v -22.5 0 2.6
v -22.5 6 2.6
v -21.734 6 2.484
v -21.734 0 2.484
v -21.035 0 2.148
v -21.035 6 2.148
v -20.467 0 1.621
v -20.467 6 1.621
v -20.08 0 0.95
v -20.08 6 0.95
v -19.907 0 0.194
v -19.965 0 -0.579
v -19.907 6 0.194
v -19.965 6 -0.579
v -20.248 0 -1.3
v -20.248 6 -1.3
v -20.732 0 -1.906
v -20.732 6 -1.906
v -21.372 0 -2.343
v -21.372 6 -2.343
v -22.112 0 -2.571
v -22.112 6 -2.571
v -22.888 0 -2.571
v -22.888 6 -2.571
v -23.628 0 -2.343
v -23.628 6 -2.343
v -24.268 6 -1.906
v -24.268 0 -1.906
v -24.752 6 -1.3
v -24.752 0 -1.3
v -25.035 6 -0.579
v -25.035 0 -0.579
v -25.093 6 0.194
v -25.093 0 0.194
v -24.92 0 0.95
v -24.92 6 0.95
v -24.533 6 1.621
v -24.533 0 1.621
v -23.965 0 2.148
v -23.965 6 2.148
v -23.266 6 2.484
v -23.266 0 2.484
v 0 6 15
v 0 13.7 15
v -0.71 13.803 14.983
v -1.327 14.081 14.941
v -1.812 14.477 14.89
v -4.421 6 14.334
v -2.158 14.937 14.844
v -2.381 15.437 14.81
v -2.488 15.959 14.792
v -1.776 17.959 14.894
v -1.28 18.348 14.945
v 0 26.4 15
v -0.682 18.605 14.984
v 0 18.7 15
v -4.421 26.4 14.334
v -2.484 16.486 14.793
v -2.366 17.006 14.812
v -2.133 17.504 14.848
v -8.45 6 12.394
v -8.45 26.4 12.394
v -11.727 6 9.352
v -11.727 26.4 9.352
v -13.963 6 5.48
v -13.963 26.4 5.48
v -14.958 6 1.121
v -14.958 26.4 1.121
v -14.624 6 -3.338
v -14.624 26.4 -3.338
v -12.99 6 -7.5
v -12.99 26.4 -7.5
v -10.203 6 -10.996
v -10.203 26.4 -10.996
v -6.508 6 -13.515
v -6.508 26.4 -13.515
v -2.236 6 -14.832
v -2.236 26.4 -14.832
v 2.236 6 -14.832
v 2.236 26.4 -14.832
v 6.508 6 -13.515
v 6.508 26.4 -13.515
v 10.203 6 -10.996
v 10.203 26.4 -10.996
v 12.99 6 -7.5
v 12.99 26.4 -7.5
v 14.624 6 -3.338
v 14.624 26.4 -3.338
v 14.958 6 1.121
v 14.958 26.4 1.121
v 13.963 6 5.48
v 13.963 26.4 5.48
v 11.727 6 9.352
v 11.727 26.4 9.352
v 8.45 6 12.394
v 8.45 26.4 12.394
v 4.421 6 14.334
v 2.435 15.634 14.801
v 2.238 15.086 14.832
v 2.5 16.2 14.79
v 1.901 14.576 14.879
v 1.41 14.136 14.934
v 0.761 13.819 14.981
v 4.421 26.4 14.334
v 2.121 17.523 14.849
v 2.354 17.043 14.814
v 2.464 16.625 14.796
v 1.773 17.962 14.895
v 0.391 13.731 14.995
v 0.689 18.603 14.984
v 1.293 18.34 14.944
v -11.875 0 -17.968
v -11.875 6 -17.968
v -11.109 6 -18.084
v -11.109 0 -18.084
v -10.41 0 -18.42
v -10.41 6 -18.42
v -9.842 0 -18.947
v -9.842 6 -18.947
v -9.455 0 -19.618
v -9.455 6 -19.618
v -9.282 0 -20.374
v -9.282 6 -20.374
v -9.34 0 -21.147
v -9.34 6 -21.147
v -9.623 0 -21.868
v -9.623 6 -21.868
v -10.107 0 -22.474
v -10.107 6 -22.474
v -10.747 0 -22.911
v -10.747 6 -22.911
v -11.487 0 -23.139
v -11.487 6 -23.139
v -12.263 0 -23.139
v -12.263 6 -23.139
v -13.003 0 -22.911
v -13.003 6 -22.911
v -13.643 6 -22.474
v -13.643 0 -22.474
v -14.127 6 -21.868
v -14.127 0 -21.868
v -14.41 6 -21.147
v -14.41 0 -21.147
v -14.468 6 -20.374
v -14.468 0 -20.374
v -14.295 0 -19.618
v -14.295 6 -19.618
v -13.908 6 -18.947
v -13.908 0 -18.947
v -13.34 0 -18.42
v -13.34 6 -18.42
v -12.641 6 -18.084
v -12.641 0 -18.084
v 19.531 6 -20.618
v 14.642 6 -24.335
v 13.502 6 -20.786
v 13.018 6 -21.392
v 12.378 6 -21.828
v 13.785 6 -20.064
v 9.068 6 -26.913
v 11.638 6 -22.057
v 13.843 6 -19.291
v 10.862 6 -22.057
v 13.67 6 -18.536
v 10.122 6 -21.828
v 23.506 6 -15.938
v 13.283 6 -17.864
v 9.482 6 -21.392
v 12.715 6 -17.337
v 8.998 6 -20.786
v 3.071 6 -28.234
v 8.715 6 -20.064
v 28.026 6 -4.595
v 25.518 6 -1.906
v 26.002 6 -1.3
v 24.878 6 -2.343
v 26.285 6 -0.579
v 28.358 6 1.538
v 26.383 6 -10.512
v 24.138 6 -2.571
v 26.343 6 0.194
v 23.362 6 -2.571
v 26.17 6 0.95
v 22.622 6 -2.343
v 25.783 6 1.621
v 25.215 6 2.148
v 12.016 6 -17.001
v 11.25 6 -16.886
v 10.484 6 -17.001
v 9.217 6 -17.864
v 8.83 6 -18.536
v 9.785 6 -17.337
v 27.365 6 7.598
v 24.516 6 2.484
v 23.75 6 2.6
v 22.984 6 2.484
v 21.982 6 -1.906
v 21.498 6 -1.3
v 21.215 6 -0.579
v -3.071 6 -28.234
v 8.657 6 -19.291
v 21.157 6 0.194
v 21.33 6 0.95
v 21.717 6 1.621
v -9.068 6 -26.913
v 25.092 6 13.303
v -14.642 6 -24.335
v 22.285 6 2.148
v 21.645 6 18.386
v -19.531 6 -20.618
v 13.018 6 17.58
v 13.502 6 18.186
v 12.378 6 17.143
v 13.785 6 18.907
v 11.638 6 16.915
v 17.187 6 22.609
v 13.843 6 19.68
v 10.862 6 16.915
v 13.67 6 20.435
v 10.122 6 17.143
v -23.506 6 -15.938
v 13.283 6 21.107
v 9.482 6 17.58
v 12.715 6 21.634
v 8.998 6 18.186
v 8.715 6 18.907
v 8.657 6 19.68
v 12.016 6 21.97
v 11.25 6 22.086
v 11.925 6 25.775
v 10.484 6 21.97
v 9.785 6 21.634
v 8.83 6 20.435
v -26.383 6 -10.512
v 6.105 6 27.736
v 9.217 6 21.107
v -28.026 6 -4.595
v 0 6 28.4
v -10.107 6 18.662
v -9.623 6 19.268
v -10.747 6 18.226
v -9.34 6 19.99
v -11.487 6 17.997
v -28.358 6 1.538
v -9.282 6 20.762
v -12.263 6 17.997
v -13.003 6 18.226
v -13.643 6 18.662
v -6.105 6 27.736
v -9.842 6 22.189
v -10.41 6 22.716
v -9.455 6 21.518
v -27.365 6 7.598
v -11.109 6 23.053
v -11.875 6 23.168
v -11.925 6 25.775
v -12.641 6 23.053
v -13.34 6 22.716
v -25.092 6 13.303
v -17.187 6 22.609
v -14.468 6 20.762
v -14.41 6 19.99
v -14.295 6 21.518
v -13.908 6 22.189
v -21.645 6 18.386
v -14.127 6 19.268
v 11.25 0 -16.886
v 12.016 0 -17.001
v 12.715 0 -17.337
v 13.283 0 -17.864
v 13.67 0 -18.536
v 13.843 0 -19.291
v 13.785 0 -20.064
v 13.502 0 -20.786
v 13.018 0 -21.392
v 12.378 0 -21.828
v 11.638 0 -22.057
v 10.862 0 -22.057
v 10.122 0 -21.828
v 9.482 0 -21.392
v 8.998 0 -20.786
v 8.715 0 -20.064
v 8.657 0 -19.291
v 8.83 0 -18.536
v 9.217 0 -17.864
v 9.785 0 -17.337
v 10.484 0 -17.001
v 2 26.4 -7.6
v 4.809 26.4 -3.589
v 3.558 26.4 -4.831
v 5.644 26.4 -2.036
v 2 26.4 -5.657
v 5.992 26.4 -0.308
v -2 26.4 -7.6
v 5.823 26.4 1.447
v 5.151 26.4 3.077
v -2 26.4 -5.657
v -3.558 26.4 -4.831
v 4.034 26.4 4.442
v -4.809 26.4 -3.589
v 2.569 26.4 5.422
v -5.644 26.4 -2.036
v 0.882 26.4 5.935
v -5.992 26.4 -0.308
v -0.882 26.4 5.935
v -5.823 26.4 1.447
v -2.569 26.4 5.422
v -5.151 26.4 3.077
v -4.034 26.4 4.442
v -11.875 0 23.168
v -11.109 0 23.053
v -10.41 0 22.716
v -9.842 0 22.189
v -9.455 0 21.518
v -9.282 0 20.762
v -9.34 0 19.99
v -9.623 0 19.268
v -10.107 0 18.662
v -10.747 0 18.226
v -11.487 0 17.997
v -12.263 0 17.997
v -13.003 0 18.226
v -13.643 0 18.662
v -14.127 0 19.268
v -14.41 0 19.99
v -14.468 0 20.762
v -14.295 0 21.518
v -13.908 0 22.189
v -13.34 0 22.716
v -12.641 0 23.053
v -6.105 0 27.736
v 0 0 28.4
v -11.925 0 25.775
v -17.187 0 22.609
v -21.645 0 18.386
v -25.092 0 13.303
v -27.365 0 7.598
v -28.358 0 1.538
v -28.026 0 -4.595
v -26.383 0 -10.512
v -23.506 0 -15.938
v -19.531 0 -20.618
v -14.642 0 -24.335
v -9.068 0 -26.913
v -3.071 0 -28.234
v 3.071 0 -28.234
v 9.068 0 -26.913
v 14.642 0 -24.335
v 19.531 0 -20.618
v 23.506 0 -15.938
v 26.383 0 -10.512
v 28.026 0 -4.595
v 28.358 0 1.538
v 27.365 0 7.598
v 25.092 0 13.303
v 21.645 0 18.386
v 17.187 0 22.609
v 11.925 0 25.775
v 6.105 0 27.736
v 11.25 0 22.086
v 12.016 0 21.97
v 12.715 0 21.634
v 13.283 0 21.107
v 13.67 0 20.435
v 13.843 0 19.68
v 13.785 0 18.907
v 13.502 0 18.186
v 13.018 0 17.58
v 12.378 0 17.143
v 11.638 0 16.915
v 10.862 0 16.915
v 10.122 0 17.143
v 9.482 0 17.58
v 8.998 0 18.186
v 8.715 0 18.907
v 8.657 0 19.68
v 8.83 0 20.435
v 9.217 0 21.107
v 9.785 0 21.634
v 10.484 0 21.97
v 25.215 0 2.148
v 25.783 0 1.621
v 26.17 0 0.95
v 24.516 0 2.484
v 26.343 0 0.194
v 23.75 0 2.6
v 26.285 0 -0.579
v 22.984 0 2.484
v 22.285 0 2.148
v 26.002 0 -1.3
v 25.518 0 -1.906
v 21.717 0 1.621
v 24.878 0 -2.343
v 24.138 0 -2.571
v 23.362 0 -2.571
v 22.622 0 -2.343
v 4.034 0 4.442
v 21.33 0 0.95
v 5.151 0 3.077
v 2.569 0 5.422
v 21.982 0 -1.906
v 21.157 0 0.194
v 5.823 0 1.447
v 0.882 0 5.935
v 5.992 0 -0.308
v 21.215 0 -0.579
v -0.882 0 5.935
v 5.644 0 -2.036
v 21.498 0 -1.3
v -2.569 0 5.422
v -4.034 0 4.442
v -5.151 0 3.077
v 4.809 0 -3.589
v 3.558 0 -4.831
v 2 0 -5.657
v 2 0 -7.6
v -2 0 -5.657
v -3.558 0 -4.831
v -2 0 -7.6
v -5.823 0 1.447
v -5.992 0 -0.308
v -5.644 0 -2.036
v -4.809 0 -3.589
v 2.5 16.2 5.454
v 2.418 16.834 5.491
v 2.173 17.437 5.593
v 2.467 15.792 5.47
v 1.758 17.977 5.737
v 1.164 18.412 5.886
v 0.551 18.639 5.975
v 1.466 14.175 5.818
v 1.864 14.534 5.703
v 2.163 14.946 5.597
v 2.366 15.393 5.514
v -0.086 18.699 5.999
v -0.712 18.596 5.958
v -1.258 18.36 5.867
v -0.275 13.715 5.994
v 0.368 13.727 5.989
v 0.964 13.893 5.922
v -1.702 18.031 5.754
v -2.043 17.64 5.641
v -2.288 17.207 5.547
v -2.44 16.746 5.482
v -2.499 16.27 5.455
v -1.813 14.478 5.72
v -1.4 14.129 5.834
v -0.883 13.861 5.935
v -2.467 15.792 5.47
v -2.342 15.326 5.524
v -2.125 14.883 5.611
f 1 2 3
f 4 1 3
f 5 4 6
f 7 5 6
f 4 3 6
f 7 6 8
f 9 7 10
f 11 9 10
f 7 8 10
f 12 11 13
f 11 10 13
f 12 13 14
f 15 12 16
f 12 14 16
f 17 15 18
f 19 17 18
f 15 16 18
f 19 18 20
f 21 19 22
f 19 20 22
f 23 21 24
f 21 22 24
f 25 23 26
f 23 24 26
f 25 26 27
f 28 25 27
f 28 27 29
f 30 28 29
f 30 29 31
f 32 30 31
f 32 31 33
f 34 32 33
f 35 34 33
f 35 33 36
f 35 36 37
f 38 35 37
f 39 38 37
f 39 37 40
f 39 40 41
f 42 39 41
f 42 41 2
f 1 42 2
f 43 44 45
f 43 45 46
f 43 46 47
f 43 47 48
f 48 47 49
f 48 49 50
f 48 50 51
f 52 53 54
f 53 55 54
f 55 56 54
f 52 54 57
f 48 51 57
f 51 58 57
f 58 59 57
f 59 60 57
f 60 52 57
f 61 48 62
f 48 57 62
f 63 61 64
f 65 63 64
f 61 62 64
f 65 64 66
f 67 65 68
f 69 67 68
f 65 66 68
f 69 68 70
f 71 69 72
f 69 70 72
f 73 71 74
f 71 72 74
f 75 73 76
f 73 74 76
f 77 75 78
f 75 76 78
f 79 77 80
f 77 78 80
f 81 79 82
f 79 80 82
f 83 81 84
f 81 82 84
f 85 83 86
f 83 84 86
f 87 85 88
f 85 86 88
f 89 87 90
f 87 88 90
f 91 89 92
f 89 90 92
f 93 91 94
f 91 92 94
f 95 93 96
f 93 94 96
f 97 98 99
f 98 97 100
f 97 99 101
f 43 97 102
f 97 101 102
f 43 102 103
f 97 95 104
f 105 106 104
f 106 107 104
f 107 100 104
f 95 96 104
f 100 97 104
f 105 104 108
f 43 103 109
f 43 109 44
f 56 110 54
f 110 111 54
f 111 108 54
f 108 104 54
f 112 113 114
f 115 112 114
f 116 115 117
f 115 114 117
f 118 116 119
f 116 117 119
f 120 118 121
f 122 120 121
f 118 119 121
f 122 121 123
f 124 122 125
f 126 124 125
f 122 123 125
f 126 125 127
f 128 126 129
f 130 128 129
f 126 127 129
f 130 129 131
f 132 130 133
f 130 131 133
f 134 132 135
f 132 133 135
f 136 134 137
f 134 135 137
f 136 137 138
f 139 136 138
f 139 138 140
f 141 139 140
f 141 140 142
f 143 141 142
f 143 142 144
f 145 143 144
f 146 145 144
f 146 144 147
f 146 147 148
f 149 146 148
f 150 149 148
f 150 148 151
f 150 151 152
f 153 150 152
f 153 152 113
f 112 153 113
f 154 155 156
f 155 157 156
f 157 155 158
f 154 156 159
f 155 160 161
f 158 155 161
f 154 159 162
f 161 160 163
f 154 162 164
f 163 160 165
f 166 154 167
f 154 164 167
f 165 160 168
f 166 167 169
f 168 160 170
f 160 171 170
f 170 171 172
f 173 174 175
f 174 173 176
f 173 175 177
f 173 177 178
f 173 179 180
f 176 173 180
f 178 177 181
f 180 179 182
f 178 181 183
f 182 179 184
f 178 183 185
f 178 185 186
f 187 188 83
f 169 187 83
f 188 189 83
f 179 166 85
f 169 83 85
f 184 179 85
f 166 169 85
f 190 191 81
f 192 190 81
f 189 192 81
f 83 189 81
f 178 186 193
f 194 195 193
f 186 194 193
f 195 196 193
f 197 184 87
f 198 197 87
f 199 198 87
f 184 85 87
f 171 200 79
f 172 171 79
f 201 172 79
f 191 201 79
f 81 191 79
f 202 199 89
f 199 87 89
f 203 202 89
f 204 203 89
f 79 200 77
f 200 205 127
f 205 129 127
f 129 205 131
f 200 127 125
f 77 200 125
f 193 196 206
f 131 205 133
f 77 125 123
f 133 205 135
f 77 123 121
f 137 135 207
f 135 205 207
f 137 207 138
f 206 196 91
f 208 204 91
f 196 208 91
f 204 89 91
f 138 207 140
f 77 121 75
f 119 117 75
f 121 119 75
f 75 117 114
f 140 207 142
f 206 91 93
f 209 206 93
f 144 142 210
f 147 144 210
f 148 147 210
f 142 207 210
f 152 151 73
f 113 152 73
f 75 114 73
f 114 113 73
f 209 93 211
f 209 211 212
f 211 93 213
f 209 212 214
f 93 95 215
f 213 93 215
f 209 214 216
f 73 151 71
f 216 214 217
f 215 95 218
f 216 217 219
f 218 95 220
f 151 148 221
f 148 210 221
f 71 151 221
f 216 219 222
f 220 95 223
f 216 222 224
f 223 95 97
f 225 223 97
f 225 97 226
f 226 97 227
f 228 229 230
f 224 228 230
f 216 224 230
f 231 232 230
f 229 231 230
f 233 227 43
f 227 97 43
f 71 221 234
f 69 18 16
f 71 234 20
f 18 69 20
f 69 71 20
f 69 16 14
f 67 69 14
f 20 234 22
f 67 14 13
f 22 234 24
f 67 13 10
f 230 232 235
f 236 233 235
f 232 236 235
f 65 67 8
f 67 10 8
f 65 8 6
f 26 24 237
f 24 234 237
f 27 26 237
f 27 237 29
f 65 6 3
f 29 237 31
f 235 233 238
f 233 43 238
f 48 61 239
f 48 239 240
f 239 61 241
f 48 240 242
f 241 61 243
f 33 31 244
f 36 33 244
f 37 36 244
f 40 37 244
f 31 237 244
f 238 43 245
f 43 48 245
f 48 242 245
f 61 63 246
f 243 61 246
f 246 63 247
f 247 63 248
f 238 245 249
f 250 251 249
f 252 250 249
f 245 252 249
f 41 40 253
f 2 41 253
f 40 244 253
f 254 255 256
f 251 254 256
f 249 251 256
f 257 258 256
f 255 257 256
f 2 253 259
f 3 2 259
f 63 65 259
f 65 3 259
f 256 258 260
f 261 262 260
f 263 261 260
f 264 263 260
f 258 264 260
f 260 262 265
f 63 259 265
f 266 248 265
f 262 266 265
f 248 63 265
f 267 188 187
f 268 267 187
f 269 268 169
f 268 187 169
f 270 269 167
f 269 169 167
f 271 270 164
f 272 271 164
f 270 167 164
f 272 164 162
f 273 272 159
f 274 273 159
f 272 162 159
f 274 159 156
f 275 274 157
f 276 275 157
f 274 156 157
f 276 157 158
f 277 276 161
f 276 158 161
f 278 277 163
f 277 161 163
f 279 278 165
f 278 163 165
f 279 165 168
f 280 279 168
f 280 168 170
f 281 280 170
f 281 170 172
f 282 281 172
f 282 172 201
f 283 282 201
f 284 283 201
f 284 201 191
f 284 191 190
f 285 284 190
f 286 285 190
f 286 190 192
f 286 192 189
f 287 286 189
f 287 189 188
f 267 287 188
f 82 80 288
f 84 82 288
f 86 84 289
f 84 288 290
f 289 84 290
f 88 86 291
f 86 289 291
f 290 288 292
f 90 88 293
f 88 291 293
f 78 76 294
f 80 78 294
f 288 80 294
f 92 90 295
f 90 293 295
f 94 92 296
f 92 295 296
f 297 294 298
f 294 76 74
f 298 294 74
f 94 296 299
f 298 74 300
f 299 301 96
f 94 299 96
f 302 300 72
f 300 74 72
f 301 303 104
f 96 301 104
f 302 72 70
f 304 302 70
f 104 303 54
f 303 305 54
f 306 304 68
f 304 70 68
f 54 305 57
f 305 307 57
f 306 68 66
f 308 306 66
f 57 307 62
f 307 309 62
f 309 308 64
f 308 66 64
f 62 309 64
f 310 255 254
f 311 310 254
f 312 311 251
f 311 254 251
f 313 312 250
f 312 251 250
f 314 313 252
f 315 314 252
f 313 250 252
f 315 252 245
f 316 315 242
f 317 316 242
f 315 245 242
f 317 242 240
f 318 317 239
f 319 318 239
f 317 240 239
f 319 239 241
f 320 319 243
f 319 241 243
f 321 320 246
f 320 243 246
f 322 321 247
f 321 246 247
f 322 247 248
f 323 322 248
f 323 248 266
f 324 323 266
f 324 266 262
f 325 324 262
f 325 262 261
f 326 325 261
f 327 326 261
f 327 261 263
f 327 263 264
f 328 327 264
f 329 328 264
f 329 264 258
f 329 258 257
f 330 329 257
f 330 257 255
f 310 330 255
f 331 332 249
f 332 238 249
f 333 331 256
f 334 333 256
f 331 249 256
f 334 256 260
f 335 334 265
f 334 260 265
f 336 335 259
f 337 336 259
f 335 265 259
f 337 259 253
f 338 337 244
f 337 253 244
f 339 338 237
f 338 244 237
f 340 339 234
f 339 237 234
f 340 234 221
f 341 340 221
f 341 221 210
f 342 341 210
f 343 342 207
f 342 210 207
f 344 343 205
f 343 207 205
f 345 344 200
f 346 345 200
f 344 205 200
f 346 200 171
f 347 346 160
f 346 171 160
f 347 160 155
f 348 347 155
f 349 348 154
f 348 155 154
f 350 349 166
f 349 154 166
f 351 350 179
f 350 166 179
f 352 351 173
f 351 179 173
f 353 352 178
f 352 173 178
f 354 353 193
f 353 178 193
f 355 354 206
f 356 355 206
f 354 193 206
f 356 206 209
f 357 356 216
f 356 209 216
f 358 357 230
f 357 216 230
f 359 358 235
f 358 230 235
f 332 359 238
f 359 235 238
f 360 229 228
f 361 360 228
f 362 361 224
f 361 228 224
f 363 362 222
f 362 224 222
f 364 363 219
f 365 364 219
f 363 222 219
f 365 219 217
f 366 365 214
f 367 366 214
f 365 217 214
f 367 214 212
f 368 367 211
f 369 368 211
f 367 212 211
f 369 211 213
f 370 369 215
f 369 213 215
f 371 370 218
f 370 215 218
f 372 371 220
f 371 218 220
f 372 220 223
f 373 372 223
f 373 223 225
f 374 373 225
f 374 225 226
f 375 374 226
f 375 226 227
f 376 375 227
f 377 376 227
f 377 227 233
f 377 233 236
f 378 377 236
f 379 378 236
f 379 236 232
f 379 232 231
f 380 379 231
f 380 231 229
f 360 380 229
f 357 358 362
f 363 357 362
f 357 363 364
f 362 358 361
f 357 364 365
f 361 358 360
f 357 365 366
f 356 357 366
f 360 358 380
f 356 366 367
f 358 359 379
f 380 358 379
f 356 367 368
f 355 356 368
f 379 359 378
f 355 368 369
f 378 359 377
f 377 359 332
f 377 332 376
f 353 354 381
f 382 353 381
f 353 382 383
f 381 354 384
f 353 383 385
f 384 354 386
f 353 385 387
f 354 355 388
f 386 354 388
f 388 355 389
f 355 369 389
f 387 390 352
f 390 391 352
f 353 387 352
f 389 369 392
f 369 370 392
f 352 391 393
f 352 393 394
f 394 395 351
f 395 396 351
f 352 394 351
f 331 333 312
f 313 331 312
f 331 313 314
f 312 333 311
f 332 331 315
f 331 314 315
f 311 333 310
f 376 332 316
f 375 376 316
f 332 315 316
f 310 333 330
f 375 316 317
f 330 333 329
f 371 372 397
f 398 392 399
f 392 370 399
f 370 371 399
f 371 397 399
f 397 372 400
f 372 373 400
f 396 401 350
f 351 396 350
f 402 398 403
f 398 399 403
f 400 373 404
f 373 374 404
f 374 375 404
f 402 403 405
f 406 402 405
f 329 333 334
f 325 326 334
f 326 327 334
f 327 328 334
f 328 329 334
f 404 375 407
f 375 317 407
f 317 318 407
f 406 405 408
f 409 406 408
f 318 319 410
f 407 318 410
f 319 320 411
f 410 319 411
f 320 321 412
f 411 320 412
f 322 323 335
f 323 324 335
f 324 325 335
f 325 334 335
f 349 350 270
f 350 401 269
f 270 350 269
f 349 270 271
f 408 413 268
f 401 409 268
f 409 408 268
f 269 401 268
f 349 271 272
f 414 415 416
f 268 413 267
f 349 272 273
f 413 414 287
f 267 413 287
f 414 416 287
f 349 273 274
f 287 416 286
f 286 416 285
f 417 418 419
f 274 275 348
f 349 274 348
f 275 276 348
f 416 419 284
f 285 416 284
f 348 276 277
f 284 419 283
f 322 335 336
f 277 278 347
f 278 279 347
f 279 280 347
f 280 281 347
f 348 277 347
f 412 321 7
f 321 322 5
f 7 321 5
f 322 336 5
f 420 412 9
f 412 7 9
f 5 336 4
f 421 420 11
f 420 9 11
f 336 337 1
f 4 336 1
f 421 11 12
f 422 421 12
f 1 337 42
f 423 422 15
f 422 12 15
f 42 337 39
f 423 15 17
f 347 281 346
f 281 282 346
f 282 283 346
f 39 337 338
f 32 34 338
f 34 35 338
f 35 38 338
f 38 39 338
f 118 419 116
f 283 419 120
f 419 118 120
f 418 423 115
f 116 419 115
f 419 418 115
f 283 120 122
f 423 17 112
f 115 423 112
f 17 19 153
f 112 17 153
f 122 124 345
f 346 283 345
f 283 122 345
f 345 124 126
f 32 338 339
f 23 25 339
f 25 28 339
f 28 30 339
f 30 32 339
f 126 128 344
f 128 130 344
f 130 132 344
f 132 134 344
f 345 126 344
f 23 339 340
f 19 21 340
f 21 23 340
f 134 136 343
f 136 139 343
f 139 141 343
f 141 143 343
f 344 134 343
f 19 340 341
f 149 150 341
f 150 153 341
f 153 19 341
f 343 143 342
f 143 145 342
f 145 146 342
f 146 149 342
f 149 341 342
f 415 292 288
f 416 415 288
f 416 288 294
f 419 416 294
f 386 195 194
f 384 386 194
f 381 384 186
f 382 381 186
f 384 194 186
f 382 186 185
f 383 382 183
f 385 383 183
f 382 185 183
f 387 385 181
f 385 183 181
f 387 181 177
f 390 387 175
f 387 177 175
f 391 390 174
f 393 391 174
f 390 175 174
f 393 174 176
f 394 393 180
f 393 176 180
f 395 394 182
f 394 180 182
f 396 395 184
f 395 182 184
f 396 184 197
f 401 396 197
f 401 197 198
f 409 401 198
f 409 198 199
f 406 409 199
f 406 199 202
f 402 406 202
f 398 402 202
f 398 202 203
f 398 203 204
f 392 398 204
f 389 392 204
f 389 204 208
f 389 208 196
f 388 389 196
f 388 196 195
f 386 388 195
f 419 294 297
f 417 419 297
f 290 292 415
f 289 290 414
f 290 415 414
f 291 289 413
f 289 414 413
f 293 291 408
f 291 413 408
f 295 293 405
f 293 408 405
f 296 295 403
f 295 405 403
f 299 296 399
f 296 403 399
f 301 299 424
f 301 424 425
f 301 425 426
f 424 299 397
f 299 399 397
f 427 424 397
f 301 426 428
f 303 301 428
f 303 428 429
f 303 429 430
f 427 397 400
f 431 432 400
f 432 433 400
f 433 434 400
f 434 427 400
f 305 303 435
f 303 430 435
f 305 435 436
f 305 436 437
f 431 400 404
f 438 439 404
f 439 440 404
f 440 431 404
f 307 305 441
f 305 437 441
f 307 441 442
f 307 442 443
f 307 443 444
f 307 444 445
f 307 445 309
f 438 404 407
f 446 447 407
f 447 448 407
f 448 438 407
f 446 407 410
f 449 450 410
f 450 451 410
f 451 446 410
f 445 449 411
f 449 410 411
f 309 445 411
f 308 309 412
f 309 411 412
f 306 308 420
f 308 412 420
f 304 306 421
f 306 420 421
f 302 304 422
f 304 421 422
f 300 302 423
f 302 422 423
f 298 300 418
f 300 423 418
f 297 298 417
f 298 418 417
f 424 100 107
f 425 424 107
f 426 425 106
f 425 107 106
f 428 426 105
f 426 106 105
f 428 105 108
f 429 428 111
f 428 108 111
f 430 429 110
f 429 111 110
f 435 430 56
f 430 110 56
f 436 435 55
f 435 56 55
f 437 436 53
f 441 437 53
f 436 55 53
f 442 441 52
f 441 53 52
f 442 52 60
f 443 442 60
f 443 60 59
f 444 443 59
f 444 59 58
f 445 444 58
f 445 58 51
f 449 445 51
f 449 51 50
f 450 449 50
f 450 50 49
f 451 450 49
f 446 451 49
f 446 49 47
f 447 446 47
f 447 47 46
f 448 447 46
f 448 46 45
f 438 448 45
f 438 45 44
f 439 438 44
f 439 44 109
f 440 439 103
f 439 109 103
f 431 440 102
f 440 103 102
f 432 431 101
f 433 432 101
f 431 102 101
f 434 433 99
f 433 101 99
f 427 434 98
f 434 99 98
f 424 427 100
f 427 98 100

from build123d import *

# Parameters (mm, degrees)
CUT_EXTRUDE2_REACH     = 47.048
SKETCH3_R              = 2.6
CUT_EXTRUDE3_REACH     = 50.063
M6_TAPPED_HOLE2_REACH  = 56.337
M6_TAPPED_HOLE2_BORE_R = 2.5


with BuildPart() as part:
    # Sketch1 → Revolve1 (revolve)
    with BuildSketch(Plane(origin=(0, 0, 0), x_dir=(0, 0, -1), z_dir=(1, 0, 0)), mode=Mode.PRIVATE) as revolve1_sk:
        Polygon((6, 0), (28.4, 0), (28.4, 6), (15, 6), (15, 26.4), (6, 26.4), align=None)
    revolve(revolve1_sk.sketch.rotate(Axis((0, 21.767139862, 0), (0, -1, 0)), 180), axis=Axis((0, 21.767139862, 0), (0, -1, 0)))

    # Sketch3 → Cut-Extrude2 (cut, up to next)
    with BuildSketch(Plane(origin=(0, 6, 0), x_dir=(1, 0, 0), z_dir=(0, 1, 0)), mode=Mode.PRIVATE) as cut_extrude2_sk1:
        with Locations(Location((-22.5, 0, 0), (0, 0, 270))):
            Circle(SKETCH3_R)
    cut_extrude2_tool1 = extrude(cut_extrude2_sk1.sketch, amount=-CUT_EXTRUDE2_REACH, mode=Mode.PRIVATE) & part.part
    # Sketch3 → Cut-Extrude2 (cut, up to next)
    with BuildSketch(Plane(origin=(0, 6, 0), x_dir=(1, 0, 0), z_dir=(0, 1, 0)), mode=Mode.PRIVATE) as cut_extrude2_sk2:
        with Locations(Location((11.25, 19.485571585, 0), (0, 0, 270))):
            Circle(SKETCH3_R)
    cut_extrude2_tool2 = extrude(cut_extrude2_sk2.sketch, amount=-CUT_EXTRUDE2_REACH, mode=Mode.PRIVATE) & part.part
    # Sketch3 → Cut-Extrude2 (cut, up to next)
    with BuildSketch(Plane(origin=(0, 6, 0), x_dir=(1, 0, 0), z_dir=(0, 1, 0)), mode=Mode.PRIVATE) as cut_extrude2_sk3:
        with Locations(Location((11.25, -19.485571585, 0), (0, 0, 270))):
            Circle(SKETCH3_R)
    cut_extrude2_tool3 = extrude(cut_extrude2_sk3.sketch, amount=-CUT_EXTRUDE2_REACH, mode=Mode.PRIVATE) & part.part
    # Sketch3 → Cut-Extrude2 (cut, up to next)
    with BuildSketch(Plane(origin=(0, 6, 0), x_dir=(1, 0, 0), z_dir=(0, 1, 0)), mode=Mode.PRIVATE) as cut_extrude2_sk4:
        with Locations(Location((23.75, 0, 0), (0, 0, 270))):
            Circle(SKETCH3_R)
    cut_extrude2_tool4 = extrude(cut_extrude2_sk4.sketch, amount=-CUT_EXTRUDE2_REACH, mode=Mode.PRIVATE) & part.part
    # Sketch3 → Cut-Extrude2 (cut, up to next)
    with BuildSketch(Plane(origin=(0, 6, 0), x_dir=(1, 0, 0), z_dir=(0, 1, 0)), mode=Mode.PRIVATE) as cut_extrude2_sk5:
        with Locations(Location((-11.875, -20.56810334, 0), (0, 0, 270))):
            Circle(SKETCH3_R)
    cut_extrude2_tool5 = extrude(cut_extrude2_sk5.sketch, amount=-CUT_EXTRUDE2_REACH, mode=Mode.PRIVATE) & part.part
    # Sketch3 → Cut-Extrude2 (cut, up to next)
    with BuildSketch(Plane(origin=(0, 6, 0), x_dir=(1, 0, 0), z_dir=(0, 1, 0)), mode=Mode.PRIVATE) as cut_extrude2_sk6:
        with Locations(Location((-11.875, 20.56810334, 0), (0, 0, 270))):
            Circle(SKETCH3_R)
    cut_extrude2_tool6 = extrude(cut_extrude2_sk6.sketch, amount=-CUT_EXTRUDE2_REACH, mode=Mode.PRIVATE) & part.part
    add(cut_extrude2_tool1.solids().sort_by_distance((-22.5, 6, 0))[0], mode=Mode.SUBTRACT)
    add(cut_extrude2_tool2.solids().sort_by_distance((11.25, 6, -19.485572))[0], mode=Mode.SUBTRACT)
    add(cut_extrude2_tool3.solids().sort_by_distance((11.25, 6, 19.485572))[0], mode=Mode.SUBTRACT)
    add(cut_extrude2_tool4.solids().sort_by_distance((23.75, 6, 0))[0], mode=Mode.SUBTRACT)
    add(cut_extrude2_tool5.solids().sort_by_distance((-11.875, 6, 20.568103))[0], mode=Mode.SUBTRACT)
    add(cut_extrude2_tool6.solids().sort_by_distance((-11.875, 6, -20.568103))[0], mode=Mode.SUBTRACT)

    # Sketch4 → Cut-Extrude3 (cut, up to next)
    with BuildSketch(Plane(origin=(0, 26.4, 0), x_dir=(1, 0, 0), z_dir=(0, 1, 0)), mode=Mode.PRIVATE) as cut_extrude3_sk1:
        with BuildLine():
            Line((-2, 7.6), (-2, 5.656854249))
            ThreePointArc((-2, 5.656854249), (0, 6), (2, 5.656854249))
            Line((2, 5.656854249), (2, 7.6))
            Line((2, 7.6), (-2, 7.6))
        make_face()
    cut_extrude3_tool1 = extrude(cut_extrude3_sk1.sketch, amount=-CUT_EXTRUDE3_REACH, mode=Mode.PRIVATE) & part.part
    add(cut_extrude3_tool1.solids().sort_by_distance((0, 26.4, -6.740451))[0], mode=Mode.SUBTRACT)

    # M6 Tapped Hole2 bore (on position points) → M6 Tapped Hole2 (cut, up to next)
    with BuildSketch(Plane(origin=(0, 16.2, 15), x_dir=(1, 0, 0), z_dir=(0, 0, 1)), mode=Mode.PRIVATE) as m6_tapped_hole2_sk1:
        Circle(M6_TAPPED_HOLE2_BORE_R)
    m6_tapped_hole2_tool1 = extrude(m6_tapped_hole2_sk1.sketch, amount=-M6_TAPPED_HOLE2_REACH, mode=Mode.PRIVATE) & part.part
    add(m6_tapped_hole2_tool1.solids().sort_by_distance((0, 16.2, 15))[0], mode=Mode.SUBTRACT)


solid = part.part
